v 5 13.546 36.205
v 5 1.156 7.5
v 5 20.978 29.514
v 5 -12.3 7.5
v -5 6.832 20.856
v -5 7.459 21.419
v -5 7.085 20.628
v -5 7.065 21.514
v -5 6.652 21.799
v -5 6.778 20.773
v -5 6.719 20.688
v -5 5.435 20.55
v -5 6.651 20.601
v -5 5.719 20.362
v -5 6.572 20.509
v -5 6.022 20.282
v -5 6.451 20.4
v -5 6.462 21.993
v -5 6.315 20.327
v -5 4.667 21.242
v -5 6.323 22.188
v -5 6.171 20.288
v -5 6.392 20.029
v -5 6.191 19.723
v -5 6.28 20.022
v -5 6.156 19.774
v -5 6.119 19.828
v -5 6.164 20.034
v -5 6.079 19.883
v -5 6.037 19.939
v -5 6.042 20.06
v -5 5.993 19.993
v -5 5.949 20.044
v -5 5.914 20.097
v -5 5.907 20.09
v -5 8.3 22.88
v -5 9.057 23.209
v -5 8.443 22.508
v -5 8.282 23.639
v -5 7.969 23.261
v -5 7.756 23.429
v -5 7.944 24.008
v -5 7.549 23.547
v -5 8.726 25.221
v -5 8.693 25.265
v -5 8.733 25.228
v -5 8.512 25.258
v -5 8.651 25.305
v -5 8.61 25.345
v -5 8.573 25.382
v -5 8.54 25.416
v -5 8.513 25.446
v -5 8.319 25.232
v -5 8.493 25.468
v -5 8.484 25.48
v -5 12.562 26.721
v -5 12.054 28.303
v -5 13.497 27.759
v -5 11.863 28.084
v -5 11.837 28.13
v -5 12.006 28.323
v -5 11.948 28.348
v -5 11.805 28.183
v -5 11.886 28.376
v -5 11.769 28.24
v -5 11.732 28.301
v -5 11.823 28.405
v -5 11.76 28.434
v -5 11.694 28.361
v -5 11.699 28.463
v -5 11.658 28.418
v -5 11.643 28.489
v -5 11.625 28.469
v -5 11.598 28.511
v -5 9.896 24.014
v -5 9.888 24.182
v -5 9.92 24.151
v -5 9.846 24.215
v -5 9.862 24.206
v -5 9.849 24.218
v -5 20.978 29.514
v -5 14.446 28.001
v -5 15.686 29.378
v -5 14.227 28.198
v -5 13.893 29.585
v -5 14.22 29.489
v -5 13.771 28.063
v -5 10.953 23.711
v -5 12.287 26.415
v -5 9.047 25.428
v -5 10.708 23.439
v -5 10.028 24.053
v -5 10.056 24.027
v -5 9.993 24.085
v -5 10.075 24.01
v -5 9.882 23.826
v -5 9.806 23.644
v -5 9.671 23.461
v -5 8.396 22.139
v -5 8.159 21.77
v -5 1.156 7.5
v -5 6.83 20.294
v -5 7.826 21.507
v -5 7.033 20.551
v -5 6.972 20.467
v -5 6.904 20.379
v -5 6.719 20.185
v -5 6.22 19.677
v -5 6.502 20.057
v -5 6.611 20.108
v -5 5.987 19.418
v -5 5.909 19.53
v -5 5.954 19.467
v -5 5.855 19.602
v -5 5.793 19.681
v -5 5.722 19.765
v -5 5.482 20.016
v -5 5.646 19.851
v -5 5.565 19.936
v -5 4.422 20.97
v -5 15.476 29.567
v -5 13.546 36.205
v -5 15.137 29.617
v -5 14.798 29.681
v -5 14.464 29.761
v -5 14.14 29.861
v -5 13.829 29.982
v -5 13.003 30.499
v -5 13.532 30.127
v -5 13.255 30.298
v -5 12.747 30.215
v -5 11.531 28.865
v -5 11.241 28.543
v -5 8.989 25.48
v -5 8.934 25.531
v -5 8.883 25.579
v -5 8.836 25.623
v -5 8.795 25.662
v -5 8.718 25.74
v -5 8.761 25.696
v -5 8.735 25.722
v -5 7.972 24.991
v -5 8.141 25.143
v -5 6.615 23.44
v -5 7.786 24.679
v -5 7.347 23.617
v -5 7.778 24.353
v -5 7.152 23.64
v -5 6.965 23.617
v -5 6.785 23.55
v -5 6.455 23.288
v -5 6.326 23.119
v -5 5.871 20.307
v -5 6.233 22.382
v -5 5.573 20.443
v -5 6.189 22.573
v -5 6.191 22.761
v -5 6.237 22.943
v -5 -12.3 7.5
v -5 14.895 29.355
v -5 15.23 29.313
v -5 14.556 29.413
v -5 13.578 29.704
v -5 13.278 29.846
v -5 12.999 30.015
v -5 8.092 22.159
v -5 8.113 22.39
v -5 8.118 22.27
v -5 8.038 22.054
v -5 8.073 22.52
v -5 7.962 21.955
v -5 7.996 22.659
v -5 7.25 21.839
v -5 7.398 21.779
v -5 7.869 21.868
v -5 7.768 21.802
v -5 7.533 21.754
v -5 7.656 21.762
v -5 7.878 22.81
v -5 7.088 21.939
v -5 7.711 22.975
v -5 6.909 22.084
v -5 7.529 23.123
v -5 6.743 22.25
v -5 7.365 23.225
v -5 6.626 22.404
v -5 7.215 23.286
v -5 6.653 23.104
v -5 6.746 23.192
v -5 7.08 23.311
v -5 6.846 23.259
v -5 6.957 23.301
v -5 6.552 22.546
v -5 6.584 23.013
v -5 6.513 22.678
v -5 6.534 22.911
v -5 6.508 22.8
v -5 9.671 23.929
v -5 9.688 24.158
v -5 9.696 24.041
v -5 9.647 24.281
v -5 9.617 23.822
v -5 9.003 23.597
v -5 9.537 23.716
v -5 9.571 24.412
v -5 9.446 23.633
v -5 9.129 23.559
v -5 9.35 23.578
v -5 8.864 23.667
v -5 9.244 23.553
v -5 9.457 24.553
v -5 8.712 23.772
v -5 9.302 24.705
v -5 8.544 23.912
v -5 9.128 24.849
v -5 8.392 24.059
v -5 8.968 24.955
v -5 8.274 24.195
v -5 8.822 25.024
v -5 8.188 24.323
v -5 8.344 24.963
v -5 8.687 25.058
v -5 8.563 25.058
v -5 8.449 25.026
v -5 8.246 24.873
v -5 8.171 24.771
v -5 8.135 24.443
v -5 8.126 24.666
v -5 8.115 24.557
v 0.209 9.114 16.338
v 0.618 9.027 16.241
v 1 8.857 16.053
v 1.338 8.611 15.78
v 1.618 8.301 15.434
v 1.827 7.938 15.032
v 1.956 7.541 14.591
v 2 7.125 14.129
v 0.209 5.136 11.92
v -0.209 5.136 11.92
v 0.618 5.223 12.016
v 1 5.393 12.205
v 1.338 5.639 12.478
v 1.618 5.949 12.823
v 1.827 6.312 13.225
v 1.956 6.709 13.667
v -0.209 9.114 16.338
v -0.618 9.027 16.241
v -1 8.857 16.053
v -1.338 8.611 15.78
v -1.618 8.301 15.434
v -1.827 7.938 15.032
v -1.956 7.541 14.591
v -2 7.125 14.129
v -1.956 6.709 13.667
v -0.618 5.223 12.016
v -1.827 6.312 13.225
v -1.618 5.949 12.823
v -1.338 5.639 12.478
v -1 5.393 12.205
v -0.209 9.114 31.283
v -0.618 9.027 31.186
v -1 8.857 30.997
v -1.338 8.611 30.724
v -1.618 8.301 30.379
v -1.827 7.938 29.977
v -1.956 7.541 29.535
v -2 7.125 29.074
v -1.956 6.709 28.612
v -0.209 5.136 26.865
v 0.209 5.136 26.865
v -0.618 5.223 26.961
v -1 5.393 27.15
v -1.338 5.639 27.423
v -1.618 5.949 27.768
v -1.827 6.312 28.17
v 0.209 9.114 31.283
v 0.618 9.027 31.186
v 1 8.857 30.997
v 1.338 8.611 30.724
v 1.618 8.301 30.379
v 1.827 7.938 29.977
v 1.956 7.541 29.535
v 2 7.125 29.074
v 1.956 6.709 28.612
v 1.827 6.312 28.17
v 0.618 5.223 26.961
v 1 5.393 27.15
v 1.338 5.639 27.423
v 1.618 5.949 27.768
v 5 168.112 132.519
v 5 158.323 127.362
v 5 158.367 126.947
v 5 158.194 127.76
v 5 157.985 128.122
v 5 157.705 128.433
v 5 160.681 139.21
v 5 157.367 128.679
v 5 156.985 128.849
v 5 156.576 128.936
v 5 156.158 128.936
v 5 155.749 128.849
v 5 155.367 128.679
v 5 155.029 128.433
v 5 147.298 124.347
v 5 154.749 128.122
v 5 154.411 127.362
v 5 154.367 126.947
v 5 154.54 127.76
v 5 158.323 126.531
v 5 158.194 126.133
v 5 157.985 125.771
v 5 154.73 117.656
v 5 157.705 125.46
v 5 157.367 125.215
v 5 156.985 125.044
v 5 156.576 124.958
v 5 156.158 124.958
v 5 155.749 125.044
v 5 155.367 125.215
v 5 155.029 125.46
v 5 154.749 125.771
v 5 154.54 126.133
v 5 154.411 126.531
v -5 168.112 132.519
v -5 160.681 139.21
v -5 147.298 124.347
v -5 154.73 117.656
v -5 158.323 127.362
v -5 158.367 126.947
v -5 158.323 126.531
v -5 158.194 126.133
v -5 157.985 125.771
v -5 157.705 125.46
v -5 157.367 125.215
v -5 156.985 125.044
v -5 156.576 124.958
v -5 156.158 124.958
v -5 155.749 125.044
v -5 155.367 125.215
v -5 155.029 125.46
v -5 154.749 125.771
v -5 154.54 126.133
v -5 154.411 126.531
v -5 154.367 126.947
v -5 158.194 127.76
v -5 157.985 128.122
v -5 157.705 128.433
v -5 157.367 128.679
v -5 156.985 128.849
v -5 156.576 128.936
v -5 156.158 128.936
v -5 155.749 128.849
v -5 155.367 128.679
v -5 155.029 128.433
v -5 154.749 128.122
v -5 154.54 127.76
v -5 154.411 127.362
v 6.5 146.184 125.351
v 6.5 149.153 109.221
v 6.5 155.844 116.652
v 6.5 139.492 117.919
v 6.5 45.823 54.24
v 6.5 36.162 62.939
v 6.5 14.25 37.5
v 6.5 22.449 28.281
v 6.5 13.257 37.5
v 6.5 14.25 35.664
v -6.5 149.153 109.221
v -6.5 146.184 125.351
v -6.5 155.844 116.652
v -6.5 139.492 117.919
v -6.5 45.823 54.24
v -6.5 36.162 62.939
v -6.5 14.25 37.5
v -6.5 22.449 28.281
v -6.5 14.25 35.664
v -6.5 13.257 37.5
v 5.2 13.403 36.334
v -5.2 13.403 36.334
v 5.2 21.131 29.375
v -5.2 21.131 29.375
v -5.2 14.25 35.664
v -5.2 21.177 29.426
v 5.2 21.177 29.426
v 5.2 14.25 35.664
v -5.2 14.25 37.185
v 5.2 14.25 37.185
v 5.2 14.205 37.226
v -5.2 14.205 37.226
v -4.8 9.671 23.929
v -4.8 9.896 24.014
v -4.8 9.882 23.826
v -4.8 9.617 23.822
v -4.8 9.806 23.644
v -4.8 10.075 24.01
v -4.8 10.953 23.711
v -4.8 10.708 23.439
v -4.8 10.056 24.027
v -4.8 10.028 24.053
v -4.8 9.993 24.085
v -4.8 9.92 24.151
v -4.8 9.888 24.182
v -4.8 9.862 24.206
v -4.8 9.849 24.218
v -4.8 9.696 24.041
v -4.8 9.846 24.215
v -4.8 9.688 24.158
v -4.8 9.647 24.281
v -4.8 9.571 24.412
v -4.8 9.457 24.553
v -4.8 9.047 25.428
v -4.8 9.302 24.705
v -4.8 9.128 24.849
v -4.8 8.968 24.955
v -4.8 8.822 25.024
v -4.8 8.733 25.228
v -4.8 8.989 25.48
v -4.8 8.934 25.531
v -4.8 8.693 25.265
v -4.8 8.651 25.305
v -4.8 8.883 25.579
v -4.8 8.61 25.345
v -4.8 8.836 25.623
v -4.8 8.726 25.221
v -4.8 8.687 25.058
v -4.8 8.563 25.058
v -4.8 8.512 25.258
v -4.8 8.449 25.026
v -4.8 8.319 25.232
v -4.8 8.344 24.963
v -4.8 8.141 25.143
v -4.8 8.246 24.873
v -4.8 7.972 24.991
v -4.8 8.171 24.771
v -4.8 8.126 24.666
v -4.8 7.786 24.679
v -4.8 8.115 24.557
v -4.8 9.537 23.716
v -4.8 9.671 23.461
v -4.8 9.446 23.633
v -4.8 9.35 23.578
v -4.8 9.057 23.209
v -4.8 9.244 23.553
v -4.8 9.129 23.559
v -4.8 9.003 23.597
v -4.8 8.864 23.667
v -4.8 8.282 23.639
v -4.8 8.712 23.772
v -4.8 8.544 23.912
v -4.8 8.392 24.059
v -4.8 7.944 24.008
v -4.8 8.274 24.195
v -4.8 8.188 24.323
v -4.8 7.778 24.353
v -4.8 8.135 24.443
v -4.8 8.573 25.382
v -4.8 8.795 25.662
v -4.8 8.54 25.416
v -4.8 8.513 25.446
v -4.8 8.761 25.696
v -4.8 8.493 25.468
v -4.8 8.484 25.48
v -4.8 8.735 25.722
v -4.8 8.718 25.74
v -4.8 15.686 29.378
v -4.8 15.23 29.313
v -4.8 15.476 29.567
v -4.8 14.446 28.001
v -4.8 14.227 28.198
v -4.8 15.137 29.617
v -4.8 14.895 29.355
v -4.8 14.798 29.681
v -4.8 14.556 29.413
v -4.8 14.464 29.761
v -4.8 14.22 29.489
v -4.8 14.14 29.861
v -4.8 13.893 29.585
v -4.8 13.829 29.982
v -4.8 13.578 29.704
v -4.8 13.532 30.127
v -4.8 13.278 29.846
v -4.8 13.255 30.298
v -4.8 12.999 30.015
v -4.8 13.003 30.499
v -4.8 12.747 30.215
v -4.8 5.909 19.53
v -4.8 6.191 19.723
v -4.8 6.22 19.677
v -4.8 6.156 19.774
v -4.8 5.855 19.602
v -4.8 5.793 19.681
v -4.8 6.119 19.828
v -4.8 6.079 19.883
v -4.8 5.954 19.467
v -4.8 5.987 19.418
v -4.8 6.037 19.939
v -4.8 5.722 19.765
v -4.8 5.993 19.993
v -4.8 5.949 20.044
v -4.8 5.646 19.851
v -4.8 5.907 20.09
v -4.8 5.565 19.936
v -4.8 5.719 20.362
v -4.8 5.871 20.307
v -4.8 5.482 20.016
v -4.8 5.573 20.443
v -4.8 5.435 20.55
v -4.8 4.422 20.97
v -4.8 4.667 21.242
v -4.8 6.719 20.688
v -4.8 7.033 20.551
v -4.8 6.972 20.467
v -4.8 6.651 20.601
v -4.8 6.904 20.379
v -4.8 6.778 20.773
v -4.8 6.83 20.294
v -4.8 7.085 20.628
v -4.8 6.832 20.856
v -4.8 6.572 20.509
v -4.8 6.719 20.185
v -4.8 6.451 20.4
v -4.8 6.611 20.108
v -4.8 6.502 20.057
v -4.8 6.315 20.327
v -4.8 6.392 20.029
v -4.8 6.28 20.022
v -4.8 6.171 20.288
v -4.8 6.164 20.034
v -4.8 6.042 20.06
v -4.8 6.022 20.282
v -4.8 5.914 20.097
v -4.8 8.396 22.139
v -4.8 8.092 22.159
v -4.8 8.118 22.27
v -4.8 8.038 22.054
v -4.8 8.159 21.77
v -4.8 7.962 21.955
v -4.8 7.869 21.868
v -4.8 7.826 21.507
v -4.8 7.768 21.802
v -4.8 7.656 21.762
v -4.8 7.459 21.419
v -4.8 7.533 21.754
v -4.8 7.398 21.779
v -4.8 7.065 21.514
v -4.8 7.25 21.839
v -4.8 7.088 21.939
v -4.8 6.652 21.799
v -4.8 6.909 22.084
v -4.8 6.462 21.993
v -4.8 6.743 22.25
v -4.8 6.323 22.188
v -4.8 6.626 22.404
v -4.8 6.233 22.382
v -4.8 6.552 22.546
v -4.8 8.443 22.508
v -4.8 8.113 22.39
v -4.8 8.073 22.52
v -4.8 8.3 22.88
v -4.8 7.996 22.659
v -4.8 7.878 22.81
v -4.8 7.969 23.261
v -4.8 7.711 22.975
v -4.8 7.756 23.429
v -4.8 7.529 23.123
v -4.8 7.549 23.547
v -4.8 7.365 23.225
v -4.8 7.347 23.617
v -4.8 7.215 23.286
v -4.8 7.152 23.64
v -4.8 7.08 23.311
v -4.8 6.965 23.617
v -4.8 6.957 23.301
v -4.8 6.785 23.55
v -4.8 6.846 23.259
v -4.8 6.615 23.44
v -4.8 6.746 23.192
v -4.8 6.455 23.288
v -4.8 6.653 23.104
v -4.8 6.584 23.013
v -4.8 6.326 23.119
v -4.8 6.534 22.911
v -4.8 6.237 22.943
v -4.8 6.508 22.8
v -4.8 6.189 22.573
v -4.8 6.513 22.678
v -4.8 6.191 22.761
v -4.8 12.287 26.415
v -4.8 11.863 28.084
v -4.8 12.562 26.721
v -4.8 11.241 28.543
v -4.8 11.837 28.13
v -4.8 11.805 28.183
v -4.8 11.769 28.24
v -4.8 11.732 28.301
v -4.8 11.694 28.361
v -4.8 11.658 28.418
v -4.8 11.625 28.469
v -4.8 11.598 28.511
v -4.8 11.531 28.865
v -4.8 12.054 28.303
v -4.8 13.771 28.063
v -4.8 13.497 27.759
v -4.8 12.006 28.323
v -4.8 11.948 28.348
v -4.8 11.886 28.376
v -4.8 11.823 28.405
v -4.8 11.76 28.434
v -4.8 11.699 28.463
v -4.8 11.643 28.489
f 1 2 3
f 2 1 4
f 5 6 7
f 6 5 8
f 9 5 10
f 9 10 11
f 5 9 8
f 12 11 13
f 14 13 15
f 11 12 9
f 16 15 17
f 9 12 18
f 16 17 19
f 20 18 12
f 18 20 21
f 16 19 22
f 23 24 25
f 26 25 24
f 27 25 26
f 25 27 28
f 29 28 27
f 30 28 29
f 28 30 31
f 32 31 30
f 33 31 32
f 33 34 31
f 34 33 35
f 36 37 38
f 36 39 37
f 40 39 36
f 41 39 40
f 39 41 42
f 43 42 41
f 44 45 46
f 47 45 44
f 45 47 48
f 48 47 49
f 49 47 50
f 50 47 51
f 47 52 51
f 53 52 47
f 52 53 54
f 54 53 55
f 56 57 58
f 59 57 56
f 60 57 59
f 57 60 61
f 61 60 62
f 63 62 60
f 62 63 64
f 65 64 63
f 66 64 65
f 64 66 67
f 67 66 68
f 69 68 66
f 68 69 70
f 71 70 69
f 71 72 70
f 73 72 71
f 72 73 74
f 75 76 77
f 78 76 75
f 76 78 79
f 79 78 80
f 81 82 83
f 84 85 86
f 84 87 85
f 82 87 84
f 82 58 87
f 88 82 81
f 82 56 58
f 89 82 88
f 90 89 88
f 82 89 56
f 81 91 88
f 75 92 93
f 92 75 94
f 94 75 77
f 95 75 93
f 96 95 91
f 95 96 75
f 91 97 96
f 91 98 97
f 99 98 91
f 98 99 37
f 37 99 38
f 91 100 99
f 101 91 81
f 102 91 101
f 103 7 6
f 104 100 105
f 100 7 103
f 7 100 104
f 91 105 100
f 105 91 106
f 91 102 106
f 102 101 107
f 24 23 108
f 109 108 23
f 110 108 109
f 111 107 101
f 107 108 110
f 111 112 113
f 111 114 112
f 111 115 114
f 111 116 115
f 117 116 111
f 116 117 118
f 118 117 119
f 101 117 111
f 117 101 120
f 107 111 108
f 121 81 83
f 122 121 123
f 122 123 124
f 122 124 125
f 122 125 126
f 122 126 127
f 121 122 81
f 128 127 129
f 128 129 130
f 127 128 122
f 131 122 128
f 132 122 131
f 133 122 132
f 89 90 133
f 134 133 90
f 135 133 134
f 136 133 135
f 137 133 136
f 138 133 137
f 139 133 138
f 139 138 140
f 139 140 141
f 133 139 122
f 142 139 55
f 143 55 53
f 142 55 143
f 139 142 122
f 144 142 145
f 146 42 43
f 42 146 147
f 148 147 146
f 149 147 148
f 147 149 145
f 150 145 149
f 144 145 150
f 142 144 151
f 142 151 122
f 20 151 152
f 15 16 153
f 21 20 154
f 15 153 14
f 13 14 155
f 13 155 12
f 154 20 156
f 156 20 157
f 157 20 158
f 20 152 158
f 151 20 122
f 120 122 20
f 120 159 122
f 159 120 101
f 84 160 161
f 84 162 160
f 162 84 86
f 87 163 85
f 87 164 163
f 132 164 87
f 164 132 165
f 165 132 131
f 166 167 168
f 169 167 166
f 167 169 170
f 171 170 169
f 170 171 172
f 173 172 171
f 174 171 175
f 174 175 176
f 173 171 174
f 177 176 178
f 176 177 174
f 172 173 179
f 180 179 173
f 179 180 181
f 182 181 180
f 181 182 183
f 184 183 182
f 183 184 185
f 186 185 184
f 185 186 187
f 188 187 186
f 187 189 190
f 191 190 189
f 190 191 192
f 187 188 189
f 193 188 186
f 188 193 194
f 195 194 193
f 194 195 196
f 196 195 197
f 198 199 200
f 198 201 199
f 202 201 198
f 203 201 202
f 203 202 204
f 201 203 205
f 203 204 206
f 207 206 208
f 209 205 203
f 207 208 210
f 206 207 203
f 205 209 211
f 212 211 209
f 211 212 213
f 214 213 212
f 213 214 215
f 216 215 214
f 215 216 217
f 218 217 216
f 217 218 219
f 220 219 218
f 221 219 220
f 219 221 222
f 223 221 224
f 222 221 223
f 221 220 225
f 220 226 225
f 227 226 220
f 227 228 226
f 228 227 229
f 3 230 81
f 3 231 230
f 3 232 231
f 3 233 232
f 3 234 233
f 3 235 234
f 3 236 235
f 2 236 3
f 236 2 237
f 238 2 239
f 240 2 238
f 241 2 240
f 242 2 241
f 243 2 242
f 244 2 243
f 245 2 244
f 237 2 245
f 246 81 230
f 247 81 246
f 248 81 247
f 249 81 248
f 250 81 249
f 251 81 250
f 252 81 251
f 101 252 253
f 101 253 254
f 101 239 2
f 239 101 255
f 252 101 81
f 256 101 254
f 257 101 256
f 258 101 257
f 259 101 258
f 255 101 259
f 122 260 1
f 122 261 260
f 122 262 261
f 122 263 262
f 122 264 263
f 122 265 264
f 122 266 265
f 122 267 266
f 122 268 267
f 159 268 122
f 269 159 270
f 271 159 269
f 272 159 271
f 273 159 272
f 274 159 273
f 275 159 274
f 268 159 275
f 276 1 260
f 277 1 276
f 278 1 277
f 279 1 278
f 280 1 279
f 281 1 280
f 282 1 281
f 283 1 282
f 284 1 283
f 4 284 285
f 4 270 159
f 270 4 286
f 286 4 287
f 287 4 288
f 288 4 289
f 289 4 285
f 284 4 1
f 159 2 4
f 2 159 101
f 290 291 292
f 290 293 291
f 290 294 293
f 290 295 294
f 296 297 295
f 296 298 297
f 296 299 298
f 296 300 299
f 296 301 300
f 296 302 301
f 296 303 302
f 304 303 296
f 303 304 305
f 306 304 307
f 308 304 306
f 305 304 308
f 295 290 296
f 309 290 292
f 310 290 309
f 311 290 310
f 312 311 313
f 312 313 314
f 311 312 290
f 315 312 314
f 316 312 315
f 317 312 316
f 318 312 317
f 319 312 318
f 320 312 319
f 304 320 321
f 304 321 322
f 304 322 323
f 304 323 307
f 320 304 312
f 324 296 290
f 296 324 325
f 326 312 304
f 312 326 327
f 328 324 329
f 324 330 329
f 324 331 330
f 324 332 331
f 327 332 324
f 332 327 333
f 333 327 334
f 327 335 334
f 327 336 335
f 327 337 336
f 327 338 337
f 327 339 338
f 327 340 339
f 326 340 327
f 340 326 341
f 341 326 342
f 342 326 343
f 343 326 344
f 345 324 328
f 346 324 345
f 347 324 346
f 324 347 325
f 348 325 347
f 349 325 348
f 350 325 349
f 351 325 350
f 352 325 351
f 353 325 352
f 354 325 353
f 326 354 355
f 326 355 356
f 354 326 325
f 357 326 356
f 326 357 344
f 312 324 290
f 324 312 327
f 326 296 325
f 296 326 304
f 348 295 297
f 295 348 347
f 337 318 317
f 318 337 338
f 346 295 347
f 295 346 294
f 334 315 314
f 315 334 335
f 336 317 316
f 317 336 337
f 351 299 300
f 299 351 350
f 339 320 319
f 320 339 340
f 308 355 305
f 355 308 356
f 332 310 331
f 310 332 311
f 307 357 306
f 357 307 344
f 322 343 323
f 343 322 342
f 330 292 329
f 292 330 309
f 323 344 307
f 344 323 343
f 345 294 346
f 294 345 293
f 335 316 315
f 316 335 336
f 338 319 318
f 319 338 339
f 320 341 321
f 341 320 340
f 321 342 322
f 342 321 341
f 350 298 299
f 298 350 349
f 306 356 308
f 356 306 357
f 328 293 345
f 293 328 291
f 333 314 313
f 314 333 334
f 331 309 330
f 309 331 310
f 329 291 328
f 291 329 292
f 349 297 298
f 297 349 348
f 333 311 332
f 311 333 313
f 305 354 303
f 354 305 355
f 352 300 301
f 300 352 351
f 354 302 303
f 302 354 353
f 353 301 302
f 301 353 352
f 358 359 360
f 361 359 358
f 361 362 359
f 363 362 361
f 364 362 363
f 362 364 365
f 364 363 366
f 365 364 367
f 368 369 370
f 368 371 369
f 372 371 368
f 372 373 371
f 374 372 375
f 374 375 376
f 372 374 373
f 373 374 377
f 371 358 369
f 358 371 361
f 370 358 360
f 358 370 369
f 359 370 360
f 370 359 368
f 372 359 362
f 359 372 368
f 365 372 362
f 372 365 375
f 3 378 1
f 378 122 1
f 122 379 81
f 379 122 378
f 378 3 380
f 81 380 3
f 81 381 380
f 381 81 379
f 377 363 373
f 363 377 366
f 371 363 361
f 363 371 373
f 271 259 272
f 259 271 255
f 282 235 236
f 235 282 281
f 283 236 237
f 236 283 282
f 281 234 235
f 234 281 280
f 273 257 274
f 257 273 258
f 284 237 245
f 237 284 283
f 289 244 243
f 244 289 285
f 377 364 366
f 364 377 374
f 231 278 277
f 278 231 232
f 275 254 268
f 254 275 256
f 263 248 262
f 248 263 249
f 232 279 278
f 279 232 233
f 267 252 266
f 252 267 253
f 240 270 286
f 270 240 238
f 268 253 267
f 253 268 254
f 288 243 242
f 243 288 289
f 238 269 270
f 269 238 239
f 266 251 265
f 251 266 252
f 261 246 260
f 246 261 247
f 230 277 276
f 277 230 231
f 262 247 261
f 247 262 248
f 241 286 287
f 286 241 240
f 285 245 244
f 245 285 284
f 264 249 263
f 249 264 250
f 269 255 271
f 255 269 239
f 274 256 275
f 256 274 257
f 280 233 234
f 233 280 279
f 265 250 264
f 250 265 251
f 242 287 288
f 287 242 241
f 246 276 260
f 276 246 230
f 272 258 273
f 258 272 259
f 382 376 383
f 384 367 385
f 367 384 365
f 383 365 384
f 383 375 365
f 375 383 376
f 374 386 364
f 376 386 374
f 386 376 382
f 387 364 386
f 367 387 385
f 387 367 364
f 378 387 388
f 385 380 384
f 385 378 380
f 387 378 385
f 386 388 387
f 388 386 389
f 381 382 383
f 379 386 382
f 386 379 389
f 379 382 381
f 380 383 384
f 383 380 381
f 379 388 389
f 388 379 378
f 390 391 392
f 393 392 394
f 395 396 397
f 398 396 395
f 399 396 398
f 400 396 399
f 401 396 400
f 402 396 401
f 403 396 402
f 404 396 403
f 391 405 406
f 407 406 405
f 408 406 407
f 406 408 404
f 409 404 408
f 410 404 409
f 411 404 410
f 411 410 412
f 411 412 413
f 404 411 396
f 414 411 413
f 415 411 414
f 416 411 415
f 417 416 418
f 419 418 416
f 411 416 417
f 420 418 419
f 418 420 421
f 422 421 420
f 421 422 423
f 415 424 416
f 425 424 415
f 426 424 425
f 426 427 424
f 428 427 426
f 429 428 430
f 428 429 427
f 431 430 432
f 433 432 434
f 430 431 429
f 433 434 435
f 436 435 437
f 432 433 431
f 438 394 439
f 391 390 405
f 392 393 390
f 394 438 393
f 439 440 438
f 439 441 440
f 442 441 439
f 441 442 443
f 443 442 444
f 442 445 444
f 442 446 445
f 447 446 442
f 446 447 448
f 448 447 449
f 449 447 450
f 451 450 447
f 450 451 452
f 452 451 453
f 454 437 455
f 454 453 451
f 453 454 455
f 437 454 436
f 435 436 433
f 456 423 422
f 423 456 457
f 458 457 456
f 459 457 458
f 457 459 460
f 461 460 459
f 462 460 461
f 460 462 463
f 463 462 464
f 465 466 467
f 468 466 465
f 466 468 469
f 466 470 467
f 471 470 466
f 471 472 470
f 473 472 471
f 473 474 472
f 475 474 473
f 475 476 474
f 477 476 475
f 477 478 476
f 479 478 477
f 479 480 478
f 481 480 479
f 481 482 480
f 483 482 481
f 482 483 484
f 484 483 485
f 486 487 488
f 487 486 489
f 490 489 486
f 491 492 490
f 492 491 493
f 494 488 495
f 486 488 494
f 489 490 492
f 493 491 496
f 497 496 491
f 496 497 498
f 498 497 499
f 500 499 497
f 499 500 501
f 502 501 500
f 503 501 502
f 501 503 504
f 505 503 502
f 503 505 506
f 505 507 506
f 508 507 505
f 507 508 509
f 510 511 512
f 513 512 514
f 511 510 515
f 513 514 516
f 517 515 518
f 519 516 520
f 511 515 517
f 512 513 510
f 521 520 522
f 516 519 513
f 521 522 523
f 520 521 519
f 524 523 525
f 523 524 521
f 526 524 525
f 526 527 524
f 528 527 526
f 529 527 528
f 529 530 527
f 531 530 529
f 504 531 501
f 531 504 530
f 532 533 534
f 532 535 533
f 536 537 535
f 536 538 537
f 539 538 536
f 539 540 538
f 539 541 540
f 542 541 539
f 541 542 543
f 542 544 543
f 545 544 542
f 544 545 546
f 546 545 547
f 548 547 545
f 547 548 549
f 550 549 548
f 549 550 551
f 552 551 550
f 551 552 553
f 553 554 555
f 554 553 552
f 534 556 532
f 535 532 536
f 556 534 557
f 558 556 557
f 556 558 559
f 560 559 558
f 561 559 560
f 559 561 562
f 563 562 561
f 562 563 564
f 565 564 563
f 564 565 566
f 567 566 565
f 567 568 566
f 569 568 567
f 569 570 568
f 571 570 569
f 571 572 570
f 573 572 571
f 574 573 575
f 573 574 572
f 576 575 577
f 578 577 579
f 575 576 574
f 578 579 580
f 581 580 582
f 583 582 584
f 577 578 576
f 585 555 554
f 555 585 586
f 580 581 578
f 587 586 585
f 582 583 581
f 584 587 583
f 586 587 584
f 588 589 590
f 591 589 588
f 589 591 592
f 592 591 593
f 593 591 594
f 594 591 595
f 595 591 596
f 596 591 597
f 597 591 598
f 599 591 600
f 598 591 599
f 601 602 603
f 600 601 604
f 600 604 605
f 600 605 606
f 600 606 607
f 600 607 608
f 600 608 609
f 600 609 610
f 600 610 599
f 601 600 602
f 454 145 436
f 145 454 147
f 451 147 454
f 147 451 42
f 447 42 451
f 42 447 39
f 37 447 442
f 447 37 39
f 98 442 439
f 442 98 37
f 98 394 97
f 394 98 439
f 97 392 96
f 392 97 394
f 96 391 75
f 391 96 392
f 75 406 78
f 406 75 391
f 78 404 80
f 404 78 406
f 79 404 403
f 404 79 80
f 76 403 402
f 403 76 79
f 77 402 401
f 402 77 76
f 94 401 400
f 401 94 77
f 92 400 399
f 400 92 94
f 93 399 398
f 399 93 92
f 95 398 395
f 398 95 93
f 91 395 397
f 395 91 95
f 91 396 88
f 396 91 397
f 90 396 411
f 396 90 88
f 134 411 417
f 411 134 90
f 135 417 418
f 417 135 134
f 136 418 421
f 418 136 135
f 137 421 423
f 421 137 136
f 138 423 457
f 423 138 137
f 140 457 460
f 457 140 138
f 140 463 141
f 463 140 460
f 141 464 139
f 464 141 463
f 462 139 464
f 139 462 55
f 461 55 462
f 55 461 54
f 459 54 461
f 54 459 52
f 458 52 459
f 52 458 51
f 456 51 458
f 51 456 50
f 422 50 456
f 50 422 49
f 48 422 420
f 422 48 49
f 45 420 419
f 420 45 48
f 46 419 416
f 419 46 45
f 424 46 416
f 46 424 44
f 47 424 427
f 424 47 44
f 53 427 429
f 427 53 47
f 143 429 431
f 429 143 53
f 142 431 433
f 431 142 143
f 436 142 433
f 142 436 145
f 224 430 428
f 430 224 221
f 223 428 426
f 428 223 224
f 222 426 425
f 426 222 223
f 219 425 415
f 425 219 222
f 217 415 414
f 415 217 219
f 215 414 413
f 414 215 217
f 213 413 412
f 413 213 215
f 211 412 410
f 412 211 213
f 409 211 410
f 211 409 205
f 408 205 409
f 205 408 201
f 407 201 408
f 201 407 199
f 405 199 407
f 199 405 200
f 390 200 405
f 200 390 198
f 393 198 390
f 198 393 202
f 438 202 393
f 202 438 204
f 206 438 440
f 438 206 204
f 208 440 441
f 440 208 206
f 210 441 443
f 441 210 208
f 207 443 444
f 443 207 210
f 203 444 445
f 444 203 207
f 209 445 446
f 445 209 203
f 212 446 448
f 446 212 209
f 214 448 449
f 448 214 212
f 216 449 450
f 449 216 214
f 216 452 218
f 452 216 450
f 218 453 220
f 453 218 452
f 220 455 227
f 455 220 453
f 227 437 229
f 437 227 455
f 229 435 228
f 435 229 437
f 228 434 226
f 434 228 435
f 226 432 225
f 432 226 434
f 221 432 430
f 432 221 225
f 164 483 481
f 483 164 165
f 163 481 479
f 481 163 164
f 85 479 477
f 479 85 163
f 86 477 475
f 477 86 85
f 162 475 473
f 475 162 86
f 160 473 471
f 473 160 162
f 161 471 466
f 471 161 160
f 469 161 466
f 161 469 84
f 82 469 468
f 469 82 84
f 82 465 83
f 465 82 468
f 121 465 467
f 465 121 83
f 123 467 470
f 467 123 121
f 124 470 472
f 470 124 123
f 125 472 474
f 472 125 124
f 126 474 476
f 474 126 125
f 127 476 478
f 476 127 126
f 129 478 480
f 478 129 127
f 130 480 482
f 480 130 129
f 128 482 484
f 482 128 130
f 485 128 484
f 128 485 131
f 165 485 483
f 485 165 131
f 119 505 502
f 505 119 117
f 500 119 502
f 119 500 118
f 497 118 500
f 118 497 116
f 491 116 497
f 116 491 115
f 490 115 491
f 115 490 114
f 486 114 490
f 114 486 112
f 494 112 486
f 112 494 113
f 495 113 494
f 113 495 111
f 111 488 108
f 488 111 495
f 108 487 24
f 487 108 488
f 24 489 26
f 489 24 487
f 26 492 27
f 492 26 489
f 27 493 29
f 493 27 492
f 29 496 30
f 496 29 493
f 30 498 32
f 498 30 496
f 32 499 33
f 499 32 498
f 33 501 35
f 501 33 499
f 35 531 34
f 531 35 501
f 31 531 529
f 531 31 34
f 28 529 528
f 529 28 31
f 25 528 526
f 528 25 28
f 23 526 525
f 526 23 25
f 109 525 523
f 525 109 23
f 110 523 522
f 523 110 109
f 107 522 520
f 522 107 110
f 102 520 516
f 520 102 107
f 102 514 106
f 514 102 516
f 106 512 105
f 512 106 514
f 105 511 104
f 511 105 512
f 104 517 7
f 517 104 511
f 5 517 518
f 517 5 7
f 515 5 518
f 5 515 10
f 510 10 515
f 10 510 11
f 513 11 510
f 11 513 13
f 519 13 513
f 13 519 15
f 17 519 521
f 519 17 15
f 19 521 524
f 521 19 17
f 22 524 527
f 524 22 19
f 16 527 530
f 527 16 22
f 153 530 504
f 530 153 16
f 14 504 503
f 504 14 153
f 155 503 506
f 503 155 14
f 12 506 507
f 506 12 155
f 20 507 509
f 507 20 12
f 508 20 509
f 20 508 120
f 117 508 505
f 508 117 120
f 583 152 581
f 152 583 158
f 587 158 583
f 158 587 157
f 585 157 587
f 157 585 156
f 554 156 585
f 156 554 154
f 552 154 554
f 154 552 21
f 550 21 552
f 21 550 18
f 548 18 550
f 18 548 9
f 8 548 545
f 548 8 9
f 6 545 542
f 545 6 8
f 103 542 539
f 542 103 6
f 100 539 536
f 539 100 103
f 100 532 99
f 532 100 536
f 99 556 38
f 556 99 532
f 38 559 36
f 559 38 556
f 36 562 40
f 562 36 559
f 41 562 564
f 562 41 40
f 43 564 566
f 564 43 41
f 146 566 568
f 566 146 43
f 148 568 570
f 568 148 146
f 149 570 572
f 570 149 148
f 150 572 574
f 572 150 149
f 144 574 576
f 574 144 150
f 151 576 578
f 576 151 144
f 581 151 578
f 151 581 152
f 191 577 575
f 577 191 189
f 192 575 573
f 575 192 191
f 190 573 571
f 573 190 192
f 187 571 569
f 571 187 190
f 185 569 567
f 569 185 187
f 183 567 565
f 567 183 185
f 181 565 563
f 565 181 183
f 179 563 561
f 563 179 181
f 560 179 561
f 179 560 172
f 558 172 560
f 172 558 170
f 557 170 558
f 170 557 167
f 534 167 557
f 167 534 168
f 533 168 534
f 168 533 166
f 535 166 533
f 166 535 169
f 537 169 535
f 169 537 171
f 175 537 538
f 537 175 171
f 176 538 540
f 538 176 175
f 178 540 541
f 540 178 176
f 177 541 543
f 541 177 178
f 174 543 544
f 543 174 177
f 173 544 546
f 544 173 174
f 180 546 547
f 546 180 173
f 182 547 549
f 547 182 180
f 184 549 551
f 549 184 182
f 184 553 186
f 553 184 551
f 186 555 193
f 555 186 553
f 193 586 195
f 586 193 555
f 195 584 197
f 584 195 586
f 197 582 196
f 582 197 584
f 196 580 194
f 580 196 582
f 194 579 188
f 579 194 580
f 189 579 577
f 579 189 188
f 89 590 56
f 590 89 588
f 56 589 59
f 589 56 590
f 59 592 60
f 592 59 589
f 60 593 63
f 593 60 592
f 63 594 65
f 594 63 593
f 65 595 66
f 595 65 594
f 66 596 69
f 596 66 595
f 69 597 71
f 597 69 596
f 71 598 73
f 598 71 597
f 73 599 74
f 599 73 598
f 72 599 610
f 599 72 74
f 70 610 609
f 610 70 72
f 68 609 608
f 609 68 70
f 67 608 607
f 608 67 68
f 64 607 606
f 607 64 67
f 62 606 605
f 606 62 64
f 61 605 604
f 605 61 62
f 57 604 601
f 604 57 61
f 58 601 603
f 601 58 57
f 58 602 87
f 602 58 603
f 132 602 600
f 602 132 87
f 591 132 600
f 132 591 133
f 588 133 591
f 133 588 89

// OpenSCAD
// file: rod.scad
rod_in_w = 10;
rod_in_h = 10;
rod_holder_wall = 1.5;
rod_outset = rod_holder_wall;
rod_holder_len = 40;
rod_gap = 0.2;
rod_angle = 90-48;
rod_delta_h = -40;
rod_low_l = 35;
rod_up_l = 110;
rod_high_l = 10;
rod_top_inside = 20;
rod_top_screw_in = 8;
// file: screw.scad
module screw_negative(h, top=false, bottom=false, extend_top=0, extend_bottom=0) {
  screw_d = 4;  screw_d_plus = 0;
  head_d = 7;   head_d_plus = 0.2;  head_dimple= 3;
  nut_d = 8;    nut_d_plus = 0;     nut_dimple = 3.5;
  cylinder(d=screw_d+screw_d_plus, h=h, $fs=0.3);
  if (top) {
    translate([0, 0, h-head_dimple])
      cylinder(d=head_d+head_d_plus, h=head_dimple+extend_top, $fs=0.3);
  }
  if (bottom) {
    translate([0,0,-extend_bottom])
      cylinder(d=nut_d+nut_d_plus, h=nut_dimple+extend_bottom, $fn=6);
  }
}
// file: engraving.scad
module engraving(name) {
  txt = str(name, " v", version);
  linear_extrude(0.2) mirror([1,0,0])
    text(txt, size=3, halign="center", valign="center", spacing=1, font="Courier");
}
// main file
version = "7";
include <engraving.scad>
include <screw.scad>

top_gap = 65.5;
bottom_gap = 42.5;
height = 28.5;
pipe_r = 3.5;
pipe_r_gap = 0.5;


side_protrusion_top = 5;
side_protrusion_bottom = 13;
screw_offset_x = bottom_gap/2 + 15.5;
min_thickness = 4;

include <rod.scad>

// case_bottom();
// case_top();
rod();

module case_top() {
  difference() {
    union() {
      basic_case();
      rod_holder();
    }
    pipe_slots();
    top_screws_negative();
    rod_in_case(rod_gap);
    translate([0,0,-50]) cube([100,100,100], center=true);
    engraving("case top");
  }
}

module rod_holder() {
  d = min_thickness+pipe_r;
  w = rod_in_w + (rod_holder_wall+rod_gap)*2;
  h = rod_in_h + (rod_holder_wall+rod_gap)*2;
  translate([-w/2,-height/2,0]) translate([0,0,d]) rotate([-rod_angle,0,0])
    cube([w,h,rod_holder_len]);

  h2 = height/2-3;
  l2 = 37.5;
  translate([-w/2,height/2-h2,0])
    cube([w,h2,l2]);
}

module rod() {
  y_offset = -height/2+rod_outset*0.33;
  difference() {
    union() {
      rod_in_case();
      rod_1(y_offset);
    }
    top_screws_negative();
    case_top();
    translate([-rod_in_w/2,10,25]) rotate([-rod_angle,0,0]) rotate([0,90,0])
      engraving("rod");
  }
}

module rod_1(y_offset) {
  d = min_thickness+pipe_r;
  w = rod_in_w + 2*rod_outset;
  h = rod_in_h + 2*rod_outset;
  weird_l_delta = 0.4;
  translate([w/2,y_offset,d]) rotate([-rod_angle,0,0]) rotate([0,-90, 0]) {
    translate([rod_holder_len-weird_l_delta,0,0]) linear_extrude(w) translate([0,-rod_delta_h]) {
      polygon(points=[[0,rod_delta_h],    [rod_low_l,rod_delta_h],
        [rod_low_l+rod_up_l,0],            [rod_low_l+rod_up_l+rod_high_l,0],
        [rod_low_l+rod_up_l+rod_high_l,h], [rod_low_l+rod_up_l,h],
        [rod_low_l,rod_delta_h+h],         [0, rod_delta_h+h]]);
    }
  }

  // top bolt
  z = rod_holder_len-weird_l_delta+rod_low_l+rod_up_l+rod_high_l;
  translate([0,y_offset,d]) rotate([-rod_angle,0,0]) {
    translate([-rod_in_w/2,-rod_delta_h+rod_outset,z])
      difference() {
        cube([rod_in_w,rod_in_h,rod_top_inside]);
        translate([0,rod_in_h/2,rod_top_screw_in]) rotate([0,90,0])
        screw_negative(rod_in_h);
      }
  }
}

module rod_in_case(enlarge=0, rod_distance=0) {
  l = 40;
  d = min_thickness+pipe_r;
  w = rod_in_w + enlarge*2;
  h = rod_in_h + enlarge*2;
  difference() {
    translate([-w/2,-height/2+rod_holder_wall*1.3-enlarge*1.3,0]) translate([0,0,d]) rotate([-rod_angle,0,0])
      cube([w,h,l]);
    cube([top_gap, height, (d+rod_distance)*2], center=true);
  }
}

module top_screws_negative() {
  translate([0, height/4, 0])
    screw_negative(min_thickness+pipe_r+30, top=true, extend_top = 5);
  translate([screw_offset_x, -height/4, 0])
    screw_negative(min_thickness+pipe_r, top=true);
  translate([-screw_offset_x, -height/4, 0])
    screw_negative(min_thickness+pipe_r, top=true);
}

module case_bottom() {
  screw_l = min_thickness+pipe_r;
  difference() {
    basic_case();
    pipe_slots();
    translate([0, height/4, screw_l]) mirror([0,0,1])
      screw_negative(screw_l, bottom=true);
    translate([screw_offset_x, -height/4, screw_l]) rotate([0,0,82]) mirror([0,0,1])
      screw_negative(screw_l, bottom=true);
    translate([-screw_offset_x, -height/4, screw_l]) rotate([0,0,-82]) mirror([0,0,1])
      screw_negative(screw_l, bottom=true);
    engraving("case bottom");
  }
}

module basic_case() {
  xt = top_gap/2 + pipe_r*2+ side_protrusion_top;
  xb = bottom_gap/2 + pipe_r*2 + side_protrusion_bottom;
  h = height/2;
  linear_extrude(min_thickness + pipe_r) 
    polygon(points=[[-xt,h], [xt,h], [xb,-h], [-xb,-h]]);
}

module pipe_slots() {
  d = (top_gap + bottom_gap) / 4;
  translate([-d-pipe_r,0,0]) pipe_slot();
  translate([d+pipe_r,0,0]) mirror([1,0,0]) pipe_slot();
}

module pipe_slot() {
  r = pipe_r + pipe_r_gap; 
  a = atan((top_gap-bottom_gap)/2 / height);
  h = height+(r*8);
  rotate([0,0,a])
    translate([0,h/2,0]) rotate([90,0,0])
      cylinder(r=r, h=h, $fs=0.3);
}
